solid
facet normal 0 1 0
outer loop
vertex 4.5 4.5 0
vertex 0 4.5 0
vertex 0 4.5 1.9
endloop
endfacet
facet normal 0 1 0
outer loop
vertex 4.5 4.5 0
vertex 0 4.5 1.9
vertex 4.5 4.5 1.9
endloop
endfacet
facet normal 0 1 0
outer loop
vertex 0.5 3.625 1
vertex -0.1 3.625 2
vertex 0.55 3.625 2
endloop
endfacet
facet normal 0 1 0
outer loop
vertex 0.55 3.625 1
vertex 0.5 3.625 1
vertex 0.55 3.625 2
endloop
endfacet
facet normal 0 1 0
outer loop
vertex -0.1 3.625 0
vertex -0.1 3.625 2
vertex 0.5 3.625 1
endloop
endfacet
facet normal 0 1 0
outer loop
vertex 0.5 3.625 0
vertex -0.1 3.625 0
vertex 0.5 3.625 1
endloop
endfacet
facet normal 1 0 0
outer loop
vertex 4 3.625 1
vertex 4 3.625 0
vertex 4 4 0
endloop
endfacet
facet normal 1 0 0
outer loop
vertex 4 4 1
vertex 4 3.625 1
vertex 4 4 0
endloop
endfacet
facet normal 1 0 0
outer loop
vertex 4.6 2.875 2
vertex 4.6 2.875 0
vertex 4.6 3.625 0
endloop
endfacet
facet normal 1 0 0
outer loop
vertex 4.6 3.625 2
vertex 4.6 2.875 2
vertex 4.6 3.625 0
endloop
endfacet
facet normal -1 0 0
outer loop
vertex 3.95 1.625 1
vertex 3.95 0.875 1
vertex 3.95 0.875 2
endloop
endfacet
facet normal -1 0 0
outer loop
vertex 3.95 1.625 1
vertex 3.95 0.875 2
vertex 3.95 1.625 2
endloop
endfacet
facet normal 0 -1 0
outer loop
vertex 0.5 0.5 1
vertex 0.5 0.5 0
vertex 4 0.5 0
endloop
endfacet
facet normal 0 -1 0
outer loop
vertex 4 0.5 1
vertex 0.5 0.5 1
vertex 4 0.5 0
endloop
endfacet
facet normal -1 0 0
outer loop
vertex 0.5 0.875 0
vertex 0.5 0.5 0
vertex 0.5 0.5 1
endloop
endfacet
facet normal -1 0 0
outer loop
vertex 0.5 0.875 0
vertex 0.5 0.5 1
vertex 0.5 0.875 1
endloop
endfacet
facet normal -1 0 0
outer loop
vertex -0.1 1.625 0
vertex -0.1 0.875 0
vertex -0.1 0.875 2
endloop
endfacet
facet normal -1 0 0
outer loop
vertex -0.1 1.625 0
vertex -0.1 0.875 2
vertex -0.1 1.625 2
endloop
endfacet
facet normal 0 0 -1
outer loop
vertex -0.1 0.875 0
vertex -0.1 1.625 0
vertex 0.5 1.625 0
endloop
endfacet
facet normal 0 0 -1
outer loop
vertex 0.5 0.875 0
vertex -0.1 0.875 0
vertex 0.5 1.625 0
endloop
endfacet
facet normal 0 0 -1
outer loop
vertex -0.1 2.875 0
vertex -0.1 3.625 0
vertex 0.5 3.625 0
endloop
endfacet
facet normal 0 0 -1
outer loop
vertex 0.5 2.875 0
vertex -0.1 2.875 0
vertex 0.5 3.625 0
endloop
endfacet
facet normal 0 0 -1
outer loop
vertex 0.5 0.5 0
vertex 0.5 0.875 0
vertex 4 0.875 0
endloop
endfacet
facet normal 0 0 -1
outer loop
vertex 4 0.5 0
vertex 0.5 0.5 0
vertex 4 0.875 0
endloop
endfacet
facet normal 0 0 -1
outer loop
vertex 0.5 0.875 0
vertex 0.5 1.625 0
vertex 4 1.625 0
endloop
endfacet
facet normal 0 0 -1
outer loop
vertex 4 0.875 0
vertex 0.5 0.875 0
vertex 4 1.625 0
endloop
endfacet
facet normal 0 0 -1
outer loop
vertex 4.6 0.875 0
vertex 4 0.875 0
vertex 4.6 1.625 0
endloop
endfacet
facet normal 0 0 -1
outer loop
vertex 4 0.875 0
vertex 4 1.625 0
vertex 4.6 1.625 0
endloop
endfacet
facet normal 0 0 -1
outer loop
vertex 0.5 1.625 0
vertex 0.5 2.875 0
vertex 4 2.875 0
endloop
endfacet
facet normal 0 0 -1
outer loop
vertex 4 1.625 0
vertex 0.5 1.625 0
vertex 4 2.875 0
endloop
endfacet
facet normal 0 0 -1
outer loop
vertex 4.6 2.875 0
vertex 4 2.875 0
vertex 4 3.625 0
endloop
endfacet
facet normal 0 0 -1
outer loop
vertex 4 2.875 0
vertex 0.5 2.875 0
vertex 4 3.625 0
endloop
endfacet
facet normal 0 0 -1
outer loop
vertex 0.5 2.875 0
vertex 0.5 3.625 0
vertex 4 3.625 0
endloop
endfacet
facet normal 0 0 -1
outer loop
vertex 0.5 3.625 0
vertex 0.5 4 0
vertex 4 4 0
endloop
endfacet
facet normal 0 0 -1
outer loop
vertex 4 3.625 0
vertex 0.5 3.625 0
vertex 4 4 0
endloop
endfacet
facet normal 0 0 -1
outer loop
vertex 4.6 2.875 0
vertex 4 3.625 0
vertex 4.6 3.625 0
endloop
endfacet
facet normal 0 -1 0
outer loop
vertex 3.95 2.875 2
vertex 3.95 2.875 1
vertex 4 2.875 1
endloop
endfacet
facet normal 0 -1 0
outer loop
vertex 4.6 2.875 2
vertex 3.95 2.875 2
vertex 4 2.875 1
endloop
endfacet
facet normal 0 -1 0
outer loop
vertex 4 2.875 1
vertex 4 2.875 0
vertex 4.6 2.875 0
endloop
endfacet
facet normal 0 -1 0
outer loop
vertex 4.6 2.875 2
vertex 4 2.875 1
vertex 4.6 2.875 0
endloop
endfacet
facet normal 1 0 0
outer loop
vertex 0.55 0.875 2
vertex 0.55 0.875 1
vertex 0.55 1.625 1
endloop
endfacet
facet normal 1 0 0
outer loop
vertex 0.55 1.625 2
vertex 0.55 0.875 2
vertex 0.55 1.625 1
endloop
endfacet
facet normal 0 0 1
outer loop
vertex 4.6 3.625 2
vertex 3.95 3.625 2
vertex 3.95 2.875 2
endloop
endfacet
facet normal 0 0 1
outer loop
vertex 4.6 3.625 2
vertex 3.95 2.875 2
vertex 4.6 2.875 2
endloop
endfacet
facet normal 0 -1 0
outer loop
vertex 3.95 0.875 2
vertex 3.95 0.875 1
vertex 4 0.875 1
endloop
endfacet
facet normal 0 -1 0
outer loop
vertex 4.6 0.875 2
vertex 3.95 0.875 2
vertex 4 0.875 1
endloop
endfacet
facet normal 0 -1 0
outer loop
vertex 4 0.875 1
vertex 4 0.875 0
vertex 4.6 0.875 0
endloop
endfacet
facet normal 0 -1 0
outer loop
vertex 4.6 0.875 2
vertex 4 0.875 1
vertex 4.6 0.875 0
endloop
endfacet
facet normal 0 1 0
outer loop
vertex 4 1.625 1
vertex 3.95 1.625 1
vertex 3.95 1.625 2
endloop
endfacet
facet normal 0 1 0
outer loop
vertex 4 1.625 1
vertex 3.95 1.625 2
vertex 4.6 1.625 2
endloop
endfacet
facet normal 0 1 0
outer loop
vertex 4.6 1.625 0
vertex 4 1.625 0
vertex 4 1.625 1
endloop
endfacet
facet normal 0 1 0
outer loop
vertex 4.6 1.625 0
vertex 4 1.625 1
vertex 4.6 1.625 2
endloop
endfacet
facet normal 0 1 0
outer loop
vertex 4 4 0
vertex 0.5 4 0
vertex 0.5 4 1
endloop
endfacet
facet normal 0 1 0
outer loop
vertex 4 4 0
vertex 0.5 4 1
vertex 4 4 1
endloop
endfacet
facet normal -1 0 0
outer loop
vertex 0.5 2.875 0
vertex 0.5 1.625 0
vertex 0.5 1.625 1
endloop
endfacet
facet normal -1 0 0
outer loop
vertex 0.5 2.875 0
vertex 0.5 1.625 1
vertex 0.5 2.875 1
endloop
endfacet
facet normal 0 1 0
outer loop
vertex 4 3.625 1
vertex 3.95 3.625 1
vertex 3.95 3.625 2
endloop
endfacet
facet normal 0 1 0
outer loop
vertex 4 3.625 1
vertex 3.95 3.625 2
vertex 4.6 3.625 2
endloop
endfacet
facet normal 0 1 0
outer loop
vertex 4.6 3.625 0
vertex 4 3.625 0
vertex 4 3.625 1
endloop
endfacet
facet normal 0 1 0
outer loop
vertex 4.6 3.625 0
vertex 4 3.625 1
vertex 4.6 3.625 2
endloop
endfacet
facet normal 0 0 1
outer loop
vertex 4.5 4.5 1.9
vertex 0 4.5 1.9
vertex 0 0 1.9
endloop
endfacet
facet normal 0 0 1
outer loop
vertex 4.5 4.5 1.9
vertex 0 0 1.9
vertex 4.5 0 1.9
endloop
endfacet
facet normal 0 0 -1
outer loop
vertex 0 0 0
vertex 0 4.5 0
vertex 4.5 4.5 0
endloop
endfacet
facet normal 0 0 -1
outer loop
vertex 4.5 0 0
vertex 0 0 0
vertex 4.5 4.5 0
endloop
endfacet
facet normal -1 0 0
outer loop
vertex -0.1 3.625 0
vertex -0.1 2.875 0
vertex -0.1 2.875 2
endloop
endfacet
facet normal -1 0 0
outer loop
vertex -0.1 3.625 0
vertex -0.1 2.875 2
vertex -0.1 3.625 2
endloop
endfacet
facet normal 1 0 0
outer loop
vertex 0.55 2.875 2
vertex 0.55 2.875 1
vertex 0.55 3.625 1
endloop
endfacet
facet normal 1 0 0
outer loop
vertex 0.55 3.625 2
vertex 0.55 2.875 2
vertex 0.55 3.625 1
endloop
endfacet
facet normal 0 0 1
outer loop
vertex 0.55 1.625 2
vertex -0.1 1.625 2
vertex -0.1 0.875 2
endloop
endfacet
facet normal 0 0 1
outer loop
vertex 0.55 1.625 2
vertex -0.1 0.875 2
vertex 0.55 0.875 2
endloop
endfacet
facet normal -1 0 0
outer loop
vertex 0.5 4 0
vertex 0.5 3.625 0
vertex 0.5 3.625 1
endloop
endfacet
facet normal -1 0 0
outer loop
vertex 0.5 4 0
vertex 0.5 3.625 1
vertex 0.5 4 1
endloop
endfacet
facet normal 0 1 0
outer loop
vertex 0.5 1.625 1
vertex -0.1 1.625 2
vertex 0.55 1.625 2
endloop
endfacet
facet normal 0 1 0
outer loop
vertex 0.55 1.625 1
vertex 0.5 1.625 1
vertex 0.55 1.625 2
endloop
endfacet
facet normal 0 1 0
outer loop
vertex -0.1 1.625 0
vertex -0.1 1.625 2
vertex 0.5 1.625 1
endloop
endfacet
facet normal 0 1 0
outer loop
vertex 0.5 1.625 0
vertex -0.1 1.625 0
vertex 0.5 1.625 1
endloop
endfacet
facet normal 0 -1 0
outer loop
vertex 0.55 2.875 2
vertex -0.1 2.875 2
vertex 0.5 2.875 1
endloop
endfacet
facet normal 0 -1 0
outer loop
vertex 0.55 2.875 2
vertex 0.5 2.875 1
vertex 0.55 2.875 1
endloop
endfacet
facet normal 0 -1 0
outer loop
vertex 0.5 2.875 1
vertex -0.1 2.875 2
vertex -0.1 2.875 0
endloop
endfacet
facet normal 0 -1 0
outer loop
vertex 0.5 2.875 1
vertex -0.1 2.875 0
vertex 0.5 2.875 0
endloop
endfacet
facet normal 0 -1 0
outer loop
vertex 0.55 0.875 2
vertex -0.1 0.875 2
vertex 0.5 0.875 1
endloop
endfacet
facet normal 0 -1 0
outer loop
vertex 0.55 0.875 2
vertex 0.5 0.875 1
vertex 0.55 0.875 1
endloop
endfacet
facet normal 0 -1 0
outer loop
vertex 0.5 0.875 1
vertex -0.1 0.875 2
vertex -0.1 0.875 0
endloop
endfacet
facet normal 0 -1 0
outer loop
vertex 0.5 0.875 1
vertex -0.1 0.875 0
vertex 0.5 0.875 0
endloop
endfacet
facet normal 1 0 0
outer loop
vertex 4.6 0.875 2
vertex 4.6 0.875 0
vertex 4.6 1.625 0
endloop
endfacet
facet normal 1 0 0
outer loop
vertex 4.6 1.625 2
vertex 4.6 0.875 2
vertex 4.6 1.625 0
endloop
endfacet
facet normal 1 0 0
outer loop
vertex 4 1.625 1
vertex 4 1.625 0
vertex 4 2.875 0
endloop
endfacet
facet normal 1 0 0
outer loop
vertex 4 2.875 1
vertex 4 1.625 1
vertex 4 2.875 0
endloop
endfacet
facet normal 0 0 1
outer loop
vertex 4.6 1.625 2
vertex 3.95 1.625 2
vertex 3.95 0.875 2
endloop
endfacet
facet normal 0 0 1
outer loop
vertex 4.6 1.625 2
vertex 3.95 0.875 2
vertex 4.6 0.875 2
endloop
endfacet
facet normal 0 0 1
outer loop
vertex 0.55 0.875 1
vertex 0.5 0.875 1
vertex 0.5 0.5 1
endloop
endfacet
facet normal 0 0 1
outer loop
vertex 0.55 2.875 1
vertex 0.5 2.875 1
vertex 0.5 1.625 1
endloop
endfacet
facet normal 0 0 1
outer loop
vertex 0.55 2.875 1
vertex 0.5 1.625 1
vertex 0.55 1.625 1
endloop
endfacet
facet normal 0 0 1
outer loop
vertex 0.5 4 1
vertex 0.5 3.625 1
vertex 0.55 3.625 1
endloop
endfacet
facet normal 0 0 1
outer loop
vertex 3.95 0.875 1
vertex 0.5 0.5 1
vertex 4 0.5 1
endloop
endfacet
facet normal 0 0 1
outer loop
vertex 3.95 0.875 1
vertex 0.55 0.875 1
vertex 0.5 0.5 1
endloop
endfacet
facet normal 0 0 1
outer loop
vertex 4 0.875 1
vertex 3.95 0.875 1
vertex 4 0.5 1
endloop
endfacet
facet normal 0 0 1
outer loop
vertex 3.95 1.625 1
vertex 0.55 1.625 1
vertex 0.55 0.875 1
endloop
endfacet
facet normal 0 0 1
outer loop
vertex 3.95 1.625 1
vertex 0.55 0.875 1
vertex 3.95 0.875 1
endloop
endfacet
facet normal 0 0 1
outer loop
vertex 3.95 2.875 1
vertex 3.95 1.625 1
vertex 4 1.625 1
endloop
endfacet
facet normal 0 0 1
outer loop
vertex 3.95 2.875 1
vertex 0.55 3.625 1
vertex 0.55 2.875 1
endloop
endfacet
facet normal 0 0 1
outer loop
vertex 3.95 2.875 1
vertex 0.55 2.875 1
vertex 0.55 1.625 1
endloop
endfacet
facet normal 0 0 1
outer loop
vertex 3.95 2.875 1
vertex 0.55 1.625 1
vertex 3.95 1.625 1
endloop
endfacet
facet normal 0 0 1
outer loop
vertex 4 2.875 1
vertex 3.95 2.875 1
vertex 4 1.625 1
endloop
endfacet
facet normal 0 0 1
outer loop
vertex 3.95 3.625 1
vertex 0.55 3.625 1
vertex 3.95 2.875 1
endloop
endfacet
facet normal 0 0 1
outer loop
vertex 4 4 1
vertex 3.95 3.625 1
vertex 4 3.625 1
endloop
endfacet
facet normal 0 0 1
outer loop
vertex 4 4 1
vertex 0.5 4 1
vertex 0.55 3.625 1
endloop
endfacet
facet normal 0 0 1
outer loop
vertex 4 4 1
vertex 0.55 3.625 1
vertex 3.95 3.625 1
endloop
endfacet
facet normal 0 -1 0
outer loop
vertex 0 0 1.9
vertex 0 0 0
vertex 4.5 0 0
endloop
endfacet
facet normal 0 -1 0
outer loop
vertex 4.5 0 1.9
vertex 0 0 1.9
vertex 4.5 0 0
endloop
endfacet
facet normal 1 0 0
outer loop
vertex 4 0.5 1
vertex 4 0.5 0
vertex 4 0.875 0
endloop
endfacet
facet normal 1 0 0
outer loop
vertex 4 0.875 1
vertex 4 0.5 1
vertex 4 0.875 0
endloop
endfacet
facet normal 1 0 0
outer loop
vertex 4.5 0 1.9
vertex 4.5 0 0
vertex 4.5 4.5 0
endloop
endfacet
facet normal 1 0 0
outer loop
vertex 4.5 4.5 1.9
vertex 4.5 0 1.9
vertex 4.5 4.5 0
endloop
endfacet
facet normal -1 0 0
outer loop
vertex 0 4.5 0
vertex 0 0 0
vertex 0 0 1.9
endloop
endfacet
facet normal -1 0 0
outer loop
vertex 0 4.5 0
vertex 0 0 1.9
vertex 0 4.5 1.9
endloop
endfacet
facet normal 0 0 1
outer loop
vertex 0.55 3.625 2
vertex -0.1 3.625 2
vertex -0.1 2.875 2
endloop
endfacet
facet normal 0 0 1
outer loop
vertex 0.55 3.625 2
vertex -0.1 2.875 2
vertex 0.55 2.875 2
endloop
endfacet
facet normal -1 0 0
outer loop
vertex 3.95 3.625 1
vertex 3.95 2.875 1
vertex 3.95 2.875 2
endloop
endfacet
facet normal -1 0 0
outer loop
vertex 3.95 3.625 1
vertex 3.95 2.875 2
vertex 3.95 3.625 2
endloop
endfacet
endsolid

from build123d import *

# Parameters (mm, degrees)
SKETCH_W            = 4.5
SKETCH_H            = 4.5
PAD_DEPTH           = 1.9
SKETCH002_W         = 3.5
SKETCH002_H         = 3.5
PAD002_DEPTH        = 1
SKETCH001_W         = 0.65
SKETCH001_H         = 0.75
PAD003_DEPTH        = 2
LINEARPATTERN_COUNT = 2
LINEARPATTERN_PITCH = 4.05


with BuildPart() as body:
    # Sketch → Pad (new body)
    with BuildSketch(Plane.XY):
        with Locations((2.25, 2.25)):
            Rectangle(SKETCH_W, SKETCH_H)
    extrude(amount=PAD_DEPTH)


with BuildPart() as body001:
    # Sketch002 → Pad002 (new body)
    with BuildSketch(Plane.XY):
        with Locations((2.25, 2.25)):
            Rectangle(SKETCH002_W, SKETCH002_H)
    extrude(amount=PAD002_DEPTH)

    # Sketch001 → Pad003 (join)
    with BuildSketch(Plane.XY):
        with Locations((0.225, 1.25)):
            Rectangle(SKETCH001_W, SKETCH001_H)
        with Locations((0.225, 3.25)):
            Rectangle(SKETCH001_W, SKETCH001_H)
    pad003 = extrude(amount=PAD003_DEPTH)

    # LinearPattern: Pad003 ×2
    with Locations(*[(i * LINEARPATTERN_PITCH, 0, 0) for i in range(1, LINEARPATTERN_COUNT)]):
        add(pad003)


solid = Compound([body.part, body001.part])
